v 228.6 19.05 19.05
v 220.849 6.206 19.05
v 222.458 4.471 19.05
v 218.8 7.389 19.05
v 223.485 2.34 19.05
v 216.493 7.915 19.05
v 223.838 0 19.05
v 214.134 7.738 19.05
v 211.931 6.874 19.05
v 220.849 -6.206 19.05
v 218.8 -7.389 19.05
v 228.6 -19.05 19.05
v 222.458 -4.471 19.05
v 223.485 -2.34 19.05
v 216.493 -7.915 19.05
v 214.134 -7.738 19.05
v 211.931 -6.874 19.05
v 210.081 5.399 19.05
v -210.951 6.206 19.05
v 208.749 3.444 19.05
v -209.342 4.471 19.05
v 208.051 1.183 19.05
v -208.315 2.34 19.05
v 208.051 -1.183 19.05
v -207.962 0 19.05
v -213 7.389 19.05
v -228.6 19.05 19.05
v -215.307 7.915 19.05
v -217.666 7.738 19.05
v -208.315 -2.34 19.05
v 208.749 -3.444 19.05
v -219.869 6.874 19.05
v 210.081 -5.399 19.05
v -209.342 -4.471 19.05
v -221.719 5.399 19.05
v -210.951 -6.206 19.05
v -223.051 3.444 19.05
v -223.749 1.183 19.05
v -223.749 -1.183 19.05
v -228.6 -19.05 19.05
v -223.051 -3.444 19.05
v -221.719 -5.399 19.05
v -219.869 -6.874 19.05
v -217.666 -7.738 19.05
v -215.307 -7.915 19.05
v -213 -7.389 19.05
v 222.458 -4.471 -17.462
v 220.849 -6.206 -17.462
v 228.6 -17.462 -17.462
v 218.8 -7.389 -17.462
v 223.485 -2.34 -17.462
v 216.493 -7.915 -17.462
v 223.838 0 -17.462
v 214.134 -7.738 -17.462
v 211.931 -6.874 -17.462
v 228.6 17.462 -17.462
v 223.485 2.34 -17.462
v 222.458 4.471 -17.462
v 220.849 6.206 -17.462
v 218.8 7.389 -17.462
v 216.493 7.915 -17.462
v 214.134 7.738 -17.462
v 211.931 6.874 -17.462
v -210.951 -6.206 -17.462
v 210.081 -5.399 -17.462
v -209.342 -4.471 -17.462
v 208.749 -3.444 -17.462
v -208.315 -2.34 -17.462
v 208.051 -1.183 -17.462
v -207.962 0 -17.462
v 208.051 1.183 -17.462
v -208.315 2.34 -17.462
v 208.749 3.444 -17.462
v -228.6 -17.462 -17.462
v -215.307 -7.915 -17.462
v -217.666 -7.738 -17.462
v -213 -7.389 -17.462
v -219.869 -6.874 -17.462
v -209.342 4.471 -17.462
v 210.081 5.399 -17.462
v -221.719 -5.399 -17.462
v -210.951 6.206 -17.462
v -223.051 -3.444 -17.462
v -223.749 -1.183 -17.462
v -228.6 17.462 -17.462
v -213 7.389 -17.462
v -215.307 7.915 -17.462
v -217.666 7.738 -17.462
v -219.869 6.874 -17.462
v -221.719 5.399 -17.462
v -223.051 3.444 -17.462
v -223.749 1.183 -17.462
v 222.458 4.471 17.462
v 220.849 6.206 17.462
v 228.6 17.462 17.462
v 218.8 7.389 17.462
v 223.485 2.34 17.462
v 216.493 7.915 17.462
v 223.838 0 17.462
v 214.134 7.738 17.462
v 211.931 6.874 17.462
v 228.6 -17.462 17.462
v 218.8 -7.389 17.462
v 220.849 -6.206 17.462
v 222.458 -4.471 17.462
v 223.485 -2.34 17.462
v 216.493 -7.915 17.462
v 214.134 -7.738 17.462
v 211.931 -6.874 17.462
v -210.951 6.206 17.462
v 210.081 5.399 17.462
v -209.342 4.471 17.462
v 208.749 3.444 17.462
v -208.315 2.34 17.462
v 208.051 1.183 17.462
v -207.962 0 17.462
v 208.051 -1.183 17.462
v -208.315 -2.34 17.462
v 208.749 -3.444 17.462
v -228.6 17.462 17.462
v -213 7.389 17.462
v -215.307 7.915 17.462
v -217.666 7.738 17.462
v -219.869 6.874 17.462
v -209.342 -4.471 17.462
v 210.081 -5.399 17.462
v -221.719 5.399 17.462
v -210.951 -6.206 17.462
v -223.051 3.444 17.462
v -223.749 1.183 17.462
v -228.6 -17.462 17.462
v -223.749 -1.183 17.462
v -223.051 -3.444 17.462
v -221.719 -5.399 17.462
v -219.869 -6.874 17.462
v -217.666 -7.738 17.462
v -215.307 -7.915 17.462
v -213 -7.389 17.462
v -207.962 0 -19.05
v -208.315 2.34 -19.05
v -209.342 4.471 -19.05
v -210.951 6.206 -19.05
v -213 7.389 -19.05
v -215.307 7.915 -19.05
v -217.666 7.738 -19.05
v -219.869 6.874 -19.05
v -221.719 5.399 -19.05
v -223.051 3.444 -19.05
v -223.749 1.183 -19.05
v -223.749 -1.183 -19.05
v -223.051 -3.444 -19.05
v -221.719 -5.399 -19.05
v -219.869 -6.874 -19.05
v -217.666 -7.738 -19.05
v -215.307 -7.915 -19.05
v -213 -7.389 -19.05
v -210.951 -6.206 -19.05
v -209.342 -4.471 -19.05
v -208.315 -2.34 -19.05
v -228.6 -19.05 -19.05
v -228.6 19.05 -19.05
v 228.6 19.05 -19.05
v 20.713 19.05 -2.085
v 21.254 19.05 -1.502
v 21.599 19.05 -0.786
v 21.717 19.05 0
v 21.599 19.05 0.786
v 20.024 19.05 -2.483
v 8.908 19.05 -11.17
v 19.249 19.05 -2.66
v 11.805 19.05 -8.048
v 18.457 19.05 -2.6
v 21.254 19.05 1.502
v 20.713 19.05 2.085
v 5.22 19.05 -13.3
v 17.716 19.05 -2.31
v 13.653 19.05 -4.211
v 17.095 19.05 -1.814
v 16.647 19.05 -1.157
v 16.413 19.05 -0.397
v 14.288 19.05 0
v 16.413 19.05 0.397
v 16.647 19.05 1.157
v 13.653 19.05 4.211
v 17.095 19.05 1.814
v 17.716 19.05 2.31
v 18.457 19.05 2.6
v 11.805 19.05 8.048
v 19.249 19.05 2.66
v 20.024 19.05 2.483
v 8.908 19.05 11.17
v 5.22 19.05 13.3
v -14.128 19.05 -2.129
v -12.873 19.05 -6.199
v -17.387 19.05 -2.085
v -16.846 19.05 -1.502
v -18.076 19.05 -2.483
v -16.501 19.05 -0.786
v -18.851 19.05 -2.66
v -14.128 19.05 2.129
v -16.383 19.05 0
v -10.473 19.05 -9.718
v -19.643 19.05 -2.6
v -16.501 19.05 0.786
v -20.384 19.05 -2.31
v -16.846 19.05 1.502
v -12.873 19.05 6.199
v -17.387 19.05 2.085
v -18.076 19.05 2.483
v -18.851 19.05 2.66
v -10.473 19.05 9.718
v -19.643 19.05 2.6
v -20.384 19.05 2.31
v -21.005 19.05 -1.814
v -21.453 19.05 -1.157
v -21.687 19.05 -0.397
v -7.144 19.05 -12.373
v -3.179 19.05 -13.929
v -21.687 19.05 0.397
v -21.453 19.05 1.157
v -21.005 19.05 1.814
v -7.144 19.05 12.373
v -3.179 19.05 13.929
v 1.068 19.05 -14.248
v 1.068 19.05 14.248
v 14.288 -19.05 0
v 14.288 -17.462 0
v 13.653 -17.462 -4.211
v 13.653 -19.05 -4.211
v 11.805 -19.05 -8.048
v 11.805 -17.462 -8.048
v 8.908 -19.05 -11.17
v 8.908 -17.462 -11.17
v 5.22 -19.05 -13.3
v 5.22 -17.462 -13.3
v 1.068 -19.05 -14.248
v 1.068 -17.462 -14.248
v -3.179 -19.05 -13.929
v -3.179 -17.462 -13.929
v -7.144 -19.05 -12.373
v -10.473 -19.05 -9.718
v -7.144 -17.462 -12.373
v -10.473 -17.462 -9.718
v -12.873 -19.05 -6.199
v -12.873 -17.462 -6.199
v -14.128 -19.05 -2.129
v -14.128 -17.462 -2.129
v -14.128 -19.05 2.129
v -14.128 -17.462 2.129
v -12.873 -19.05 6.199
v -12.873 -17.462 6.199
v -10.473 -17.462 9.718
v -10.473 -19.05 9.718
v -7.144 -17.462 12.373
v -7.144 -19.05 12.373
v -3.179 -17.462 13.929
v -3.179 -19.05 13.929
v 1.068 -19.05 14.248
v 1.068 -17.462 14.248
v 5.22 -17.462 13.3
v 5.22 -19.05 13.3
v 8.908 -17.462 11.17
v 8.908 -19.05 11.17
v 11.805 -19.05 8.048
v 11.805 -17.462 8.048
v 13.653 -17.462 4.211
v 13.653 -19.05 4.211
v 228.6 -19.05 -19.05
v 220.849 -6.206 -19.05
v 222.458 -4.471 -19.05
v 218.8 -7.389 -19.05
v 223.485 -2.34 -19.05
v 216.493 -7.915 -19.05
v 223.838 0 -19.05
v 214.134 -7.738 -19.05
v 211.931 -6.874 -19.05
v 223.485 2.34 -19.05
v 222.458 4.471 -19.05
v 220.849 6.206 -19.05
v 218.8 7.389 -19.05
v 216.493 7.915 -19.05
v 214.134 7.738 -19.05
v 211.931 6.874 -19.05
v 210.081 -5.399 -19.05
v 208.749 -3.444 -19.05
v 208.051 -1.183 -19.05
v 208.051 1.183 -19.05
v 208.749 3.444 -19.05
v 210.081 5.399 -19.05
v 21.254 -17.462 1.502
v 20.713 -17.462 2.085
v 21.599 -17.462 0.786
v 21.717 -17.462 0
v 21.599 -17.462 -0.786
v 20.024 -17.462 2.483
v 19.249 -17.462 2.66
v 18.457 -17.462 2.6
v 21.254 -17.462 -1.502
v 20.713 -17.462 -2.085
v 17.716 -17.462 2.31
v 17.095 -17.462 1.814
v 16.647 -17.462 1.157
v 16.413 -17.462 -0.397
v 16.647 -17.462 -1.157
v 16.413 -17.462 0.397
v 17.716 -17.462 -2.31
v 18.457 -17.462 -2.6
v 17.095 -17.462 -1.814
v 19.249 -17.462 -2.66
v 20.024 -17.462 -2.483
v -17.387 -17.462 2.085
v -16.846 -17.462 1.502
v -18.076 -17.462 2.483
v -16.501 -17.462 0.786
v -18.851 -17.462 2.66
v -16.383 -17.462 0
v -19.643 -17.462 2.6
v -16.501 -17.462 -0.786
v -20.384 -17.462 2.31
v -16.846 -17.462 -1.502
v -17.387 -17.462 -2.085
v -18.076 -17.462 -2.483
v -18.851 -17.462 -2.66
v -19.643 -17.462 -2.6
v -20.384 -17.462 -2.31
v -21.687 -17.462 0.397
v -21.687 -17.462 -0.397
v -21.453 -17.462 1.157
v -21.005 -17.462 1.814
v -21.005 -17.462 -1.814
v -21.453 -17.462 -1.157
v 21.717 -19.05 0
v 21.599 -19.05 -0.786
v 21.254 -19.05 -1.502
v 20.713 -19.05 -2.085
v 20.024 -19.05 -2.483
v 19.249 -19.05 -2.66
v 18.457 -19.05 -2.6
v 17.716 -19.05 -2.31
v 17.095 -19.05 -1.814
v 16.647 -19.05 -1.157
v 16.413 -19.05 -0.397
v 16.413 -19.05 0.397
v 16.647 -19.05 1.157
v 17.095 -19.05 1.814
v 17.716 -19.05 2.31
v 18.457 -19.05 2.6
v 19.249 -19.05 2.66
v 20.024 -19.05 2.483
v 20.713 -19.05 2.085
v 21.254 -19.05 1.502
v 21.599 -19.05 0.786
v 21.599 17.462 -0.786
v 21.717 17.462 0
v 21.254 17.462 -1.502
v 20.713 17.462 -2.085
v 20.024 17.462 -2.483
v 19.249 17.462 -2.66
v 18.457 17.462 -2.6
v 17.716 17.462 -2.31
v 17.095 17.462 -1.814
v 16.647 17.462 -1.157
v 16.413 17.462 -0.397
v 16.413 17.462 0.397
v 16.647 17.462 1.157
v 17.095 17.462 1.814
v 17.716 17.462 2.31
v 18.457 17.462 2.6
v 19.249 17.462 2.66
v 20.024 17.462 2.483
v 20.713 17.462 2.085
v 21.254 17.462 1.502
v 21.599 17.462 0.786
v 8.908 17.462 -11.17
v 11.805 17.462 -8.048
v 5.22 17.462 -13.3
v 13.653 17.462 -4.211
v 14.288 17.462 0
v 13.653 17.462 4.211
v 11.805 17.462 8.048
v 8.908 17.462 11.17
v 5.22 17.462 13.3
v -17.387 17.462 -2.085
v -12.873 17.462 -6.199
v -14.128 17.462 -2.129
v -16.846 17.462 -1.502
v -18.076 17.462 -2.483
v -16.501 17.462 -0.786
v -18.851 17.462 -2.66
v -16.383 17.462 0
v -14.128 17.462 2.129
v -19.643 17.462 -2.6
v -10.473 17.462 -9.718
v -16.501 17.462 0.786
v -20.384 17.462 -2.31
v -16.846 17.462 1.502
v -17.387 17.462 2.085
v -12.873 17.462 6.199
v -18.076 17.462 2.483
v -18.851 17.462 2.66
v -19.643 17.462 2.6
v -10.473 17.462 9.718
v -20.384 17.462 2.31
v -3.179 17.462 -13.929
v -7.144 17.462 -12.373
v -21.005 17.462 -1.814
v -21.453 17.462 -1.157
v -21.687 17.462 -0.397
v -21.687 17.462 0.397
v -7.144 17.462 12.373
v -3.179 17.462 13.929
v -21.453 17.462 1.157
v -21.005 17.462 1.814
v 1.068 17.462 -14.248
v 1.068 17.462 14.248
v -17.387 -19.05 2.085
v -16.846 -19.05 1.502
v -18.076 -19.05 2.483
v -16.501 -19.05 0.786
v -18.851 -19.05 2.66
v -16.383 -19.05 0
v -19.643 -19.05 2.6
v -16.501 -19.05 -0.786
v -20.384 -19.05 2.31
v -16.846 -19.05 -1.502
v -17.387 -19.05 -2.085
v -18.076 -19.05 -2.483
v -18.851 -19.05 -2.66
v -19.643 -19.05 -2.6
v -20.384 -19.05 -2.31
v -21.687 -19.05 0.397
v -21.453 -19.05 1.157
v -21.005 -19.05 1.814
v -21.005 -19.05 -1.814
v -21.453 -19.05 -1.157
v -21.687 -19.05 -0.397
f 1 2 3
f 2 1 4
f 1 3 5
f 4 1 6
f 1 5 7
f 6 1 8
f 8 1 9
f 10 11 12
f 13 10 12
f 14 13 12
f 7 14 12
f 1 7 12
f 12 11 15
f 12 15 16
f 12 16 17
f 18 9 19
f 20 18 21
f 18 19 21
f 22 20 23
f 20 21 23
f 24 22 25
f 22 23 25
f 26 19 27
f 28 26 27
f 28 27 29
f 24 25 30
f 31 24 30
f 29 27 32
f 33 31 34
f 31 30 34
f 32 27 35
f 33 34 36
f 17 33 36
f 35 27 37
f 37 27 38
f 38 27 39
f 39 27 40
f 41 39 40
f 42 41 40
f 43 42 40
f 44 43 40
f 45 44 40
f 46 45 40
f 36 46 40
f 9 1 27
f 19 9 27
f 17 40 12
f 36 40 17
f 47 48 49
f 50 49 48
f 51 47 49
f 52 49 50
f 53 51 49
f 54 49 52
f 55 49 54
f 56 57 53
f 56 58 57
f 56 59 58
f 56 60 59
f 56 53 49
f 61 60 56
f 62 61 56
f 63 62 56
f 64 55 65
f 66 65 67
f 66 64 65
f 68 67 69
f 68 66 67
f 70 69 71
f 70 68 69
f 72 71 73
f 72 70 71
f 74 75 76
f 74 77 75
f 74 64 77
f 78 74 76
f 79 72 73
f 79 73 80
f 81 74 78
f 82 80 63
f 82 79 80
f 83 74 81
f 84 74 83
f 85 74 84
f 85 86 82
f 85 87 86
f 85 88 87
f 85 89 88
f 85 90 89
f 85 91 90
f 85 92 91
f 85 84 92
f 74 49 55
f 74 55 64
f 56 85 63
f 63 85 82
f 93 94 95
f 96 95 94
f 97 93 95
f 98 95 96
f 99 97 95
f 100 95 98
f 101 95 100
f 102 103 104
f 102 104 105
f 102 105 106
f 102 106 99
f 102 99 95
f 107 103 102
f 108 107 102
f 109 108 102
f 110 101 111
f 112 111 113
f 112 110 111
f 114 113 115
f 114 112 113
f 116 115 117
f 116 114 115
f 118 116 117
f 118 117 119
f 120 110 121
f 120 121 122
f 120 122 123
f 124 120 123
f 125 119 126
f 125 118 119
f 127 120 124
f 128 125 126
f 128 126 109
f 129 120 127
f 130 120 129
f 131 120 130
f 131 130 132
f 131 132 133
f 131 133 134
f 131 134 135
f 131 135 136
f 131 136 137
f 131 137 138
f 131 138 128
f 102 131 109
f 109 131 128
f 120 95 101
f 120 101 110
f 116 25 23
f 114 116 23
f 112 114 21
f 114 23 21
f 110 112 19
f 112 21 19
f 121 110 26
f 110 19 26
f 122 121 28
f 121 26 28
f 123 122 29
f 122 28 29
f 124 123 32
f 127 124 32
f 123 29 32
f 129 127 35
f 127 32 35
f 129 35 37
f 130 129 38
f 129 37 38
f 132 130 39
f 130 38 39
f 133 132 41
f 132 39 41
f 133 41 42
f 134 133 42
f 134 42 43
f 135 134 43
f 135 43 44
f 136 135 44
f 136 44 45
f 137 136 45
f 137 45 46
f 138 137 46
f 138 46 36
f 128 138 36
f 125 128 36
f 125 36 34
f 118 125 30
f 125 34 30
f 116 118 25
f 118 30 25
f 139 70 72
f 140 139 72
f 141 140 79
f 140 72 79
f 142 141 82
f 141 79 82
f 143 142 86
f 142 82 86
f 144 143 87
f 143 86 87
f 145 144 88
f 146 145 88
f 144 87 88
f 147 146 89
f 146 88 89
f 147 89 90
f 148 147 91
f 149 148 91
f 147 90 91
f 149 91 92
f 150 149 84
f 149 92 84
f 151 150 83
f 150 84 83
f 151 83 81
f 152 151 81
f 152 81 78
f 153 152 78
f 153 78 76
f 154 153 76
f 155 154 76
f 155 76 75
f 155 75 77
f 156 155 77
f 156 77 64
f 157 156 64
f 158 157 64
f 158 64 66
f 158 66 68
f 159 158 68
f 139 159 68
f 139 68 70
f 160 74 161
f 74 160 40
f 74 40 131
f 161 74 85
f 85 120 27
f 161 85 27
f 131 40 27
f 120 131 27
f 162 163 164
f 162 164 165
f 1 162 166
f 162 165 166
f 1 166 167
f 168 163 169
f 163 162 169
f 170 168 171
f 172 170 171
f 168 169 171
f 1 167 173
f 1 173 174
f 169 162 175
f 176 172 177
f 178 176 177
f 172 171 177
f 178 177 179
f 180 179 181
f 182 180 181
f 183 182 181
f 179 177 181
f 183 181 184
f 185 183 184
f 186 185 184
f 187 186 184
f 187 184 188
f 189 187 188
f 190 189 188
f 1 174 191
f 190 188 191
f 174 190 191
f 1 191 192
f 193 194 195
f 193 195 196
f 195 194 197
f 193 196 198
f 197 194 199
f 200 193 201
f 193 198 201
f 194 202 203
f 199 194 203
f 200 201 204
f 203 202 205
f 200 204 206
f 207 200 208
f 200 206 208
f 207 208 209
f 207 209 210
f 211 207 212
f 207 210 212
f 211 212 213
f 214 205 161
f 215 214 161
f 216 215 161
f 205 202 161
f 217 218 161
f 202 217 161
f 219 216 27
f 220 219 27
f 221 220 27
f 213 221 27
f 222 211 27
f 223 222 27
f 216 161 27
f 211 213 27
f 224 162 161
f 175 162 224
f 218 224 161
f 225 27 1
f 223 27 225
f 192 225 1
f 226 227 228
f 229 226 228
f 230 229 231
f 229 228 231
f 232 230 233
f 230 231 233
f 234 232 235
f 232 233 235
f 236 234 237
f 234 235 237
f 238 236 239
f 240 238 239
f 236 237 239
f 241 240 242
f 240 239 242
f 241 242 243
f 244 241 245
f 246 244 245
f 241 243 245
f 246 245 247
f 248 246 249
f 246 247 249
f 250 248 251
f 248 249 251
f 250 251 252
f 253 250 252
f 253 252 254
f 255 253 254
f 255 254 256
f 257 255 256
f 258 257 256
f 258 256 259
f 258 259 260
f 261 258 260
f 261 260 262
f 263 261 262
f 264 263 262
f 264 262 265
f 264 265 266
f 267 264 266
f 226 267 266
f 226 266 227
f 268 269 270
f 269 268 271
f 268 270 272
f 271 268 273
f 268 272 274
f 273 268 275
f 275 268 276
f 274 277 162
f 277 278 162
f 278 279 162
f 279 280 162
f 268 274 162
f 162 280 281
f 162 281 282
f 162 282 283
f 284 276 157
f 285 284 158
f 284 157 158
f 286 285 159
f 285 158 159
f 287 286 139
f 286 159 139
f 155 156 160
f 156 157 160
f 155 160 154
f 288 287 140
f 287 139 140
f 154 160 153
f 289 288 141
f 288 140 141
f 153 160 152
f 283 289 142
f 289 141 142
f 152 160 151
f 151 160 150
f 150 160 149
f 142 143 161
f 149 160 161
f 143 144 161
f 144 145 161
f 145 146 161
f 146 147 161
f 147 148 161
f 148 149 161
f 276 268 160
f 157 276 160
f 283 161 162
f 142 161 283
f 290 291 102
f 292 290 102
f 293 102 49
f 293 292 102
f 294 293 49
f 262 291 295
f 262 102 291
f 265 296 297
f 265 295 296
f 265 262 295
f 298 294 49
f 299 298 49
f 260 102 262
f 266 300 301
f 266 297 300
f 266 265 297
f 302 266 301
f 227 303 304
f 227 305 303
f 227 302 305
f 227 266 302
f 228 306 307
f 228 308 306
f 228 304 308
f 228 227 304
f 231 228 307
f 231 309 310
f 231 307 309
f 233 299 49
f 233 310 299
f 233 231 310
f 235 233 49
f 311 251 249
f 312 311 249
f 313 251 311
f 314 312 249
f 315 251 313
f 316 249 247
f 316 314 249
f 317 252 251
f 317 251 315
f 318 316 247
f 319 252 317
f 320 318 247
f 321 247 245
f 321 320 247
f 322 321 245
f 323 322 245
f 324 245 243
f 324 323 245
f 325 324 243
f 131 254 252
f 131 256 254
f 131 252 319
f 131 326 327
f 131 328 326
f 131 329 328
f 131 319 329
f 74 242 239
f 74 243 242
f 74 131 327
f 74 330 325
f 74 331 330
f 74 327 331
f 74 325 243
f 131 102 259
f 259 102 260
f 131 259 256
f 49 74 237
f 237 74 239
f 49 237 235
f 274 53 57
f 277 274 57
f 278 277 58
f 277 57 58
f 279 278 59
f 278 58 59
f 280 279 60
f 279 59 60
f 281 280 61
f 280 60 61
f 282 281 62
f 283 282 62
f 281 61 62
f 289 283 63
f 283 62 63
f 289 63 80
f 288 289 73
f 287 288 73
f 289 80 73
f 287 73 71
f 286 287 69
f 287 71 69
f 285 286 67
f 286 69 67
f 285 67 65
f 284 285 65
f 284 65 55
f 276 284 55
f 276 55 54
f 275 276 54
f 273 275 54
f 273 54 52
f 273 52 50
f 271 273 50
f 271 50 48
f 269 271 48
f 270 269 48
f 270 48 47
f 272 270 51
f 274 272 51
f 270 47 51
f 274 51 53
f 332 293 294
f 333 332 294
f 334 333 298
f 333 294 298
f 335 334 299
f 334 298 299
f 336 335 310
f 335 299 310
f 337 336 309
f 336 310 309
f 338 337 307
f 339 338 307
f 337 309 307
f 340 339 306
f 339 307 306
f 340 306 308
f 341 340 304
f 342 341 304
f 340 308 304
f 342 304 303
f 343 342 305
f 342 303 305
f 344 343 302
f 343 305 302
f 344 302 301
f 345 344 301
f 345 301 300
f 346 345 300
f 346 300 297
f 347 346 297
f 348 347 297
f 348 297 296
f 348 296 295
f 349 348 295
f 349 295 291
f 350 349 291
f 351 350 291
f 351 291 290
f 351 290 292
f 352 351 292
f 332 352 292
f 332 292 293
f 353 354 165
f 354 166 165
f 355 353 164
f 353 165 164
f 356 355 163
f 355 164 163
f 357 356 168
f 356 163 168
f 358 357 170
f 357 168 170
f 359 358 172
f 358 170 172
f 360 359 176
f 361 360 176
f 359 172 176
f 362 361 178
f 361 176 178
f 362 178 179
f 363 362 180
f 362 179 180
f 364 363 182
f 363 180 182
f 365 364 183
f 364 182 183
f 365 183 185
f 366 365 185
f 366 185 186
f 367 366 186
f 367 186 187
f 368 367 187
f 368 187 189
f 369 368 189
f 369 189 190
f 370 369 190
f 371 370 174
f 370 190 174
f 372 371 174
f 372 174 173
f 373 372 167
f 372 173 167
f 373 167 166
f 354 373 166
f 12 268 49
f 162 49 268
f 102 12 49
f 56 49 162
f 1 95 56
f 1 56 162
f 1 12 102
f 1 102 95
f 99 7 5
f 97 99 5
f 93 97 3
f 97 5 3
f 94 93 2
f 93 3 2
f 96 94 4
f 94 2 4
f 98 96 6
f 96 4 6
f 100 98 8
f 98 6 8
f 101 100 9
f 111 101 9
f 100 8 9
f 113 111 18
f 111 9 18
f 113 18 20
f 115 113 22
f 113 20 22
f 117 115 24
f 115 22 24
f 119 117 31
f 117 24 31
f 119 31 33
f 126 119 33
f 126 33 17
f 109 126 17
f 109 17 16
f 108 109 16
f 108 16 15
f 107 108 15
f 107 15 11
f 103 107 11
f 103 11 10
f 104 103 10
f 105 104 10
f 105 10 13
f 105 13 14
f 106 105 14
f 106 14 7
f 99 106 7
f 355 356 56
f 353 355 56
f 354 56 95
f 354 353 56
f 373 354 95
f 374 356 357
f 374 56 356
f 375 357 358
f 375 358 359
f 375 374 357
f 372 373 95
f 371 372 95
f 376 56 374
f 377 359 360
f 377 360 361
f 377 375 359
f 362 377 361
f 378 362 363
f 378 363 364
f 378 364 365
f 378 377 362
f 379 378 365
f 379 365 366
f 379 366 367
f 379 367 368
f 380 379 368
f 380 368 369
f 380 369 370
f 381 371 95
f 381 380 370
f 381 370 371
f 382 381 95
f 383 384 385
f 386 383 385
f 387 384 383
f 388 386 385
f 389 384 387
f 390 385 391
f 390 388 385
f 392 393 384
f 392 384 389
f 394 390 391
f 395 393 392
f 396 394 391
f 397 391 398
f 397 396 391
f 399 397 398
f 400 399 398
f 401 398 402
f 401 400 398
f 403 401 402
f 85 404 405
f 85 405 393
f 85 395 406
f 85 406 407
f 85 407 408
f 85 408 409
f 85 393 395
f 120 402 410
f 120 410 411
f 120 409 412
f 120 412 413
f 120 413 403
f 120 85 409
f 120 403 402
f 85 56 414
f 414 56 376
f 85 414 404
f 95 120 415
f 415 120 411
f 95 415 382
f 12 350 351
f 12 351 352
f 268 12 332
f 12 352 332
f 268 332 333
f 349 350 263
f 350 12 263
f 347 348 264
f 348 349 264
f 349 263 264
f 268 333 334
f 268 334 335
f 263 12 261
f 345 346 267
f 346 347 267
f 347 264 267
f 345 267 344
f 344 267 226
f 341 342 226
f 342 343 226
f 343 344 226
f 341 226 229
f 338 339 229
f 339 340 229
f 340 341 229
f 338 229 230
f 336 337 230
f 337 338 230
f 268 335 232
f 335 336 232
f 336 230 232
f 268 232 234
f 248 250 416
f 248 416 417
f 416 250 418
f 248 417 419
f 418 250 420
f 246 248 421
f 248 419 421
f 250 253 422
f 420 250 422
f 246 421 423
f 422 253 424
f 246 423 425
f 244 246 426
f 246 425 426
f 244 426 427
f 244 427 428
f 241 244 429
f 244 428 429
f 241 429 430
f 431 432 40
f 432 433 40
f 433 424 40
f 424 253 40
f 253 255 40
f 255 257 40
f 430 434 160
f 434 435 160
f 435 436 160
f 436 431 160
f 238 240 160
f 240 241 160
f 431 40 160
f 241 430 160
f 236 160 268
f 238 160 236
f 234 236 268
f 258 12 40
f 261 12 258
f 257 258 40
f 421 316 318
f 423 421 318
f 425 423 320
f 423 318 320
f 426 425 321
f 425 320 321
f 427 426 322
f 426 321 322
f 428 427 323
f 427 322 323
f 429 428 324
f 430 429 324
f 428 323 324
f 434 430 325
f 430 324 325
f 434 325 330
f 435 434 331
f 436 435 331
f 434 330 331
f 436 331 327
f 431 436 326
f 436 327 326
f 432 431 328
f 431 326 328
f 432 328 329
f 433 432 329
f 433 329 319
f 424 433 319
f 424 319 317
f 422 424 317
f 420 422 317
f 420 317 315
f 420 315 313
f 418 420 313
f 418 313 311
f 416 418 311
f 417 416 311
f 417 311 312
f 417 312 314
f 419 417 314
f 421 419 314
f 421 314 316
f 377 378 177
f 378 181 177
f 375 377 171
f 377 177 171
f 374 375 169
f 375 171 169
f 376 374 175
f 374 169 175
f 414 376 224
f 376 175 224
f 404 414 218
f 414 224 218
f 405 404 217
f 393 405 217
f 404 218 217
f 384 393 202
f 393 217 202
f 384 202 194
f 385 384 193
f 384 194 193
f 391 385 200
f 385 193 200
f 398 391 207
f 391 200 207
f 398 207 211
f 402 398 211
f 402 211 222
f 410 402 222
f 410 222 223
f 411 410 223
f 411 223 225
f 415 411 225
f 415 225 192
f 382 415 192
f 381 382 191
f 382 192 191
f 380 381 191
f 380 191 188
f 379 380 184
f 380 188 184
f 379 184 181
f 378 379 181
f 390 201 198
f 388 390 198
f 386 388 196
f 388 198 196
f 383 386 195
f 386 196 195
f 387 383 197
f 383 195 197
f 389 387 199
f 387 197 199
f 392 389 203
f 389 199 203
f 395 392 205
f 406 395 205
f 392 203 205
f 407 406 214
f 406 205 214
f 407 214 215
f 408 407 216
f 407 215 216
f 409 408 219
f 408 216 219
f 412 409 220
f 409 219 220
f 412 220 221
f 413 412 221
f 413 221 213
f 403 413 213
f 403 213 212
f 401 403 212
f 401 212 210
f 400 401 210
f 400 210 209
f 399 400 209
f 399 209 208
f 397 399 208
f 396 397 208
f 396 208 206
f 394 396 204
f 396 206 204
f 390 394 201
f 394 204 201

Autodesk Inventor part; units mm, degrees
ref_plane "YZ Plane" through (0, 0, 0) normal (1, 0, 0) x (0, 1, 0)
ref_plane "XZ Plane" through (0, 0, 0) normal (0, 1, 0) x (-1, 0, 0)
ref_plane "XY Plane" through (0, 0, 0) normal (0, 0, 1) x (1, 0, 0)
sketch "Sketch2" plane through (0, 0, 0) normal (1, 0, 0) x (0, 1, 0)
  line L0 (0, -26.67) -> (0, 26.67) construction
  line L1 (-26.67, 0) -> (26.67, 0) construction
  line L2 (17.4625, 17.4625) -> (-17.4625, 17.4625)
  line L3 (-17.4625, 17.4625) -> (-17.4625, -17.4625)
  line L4 (-17.4625, -17.4625) -> (17.4625, -17.4625)
  line L5 (17.4625, -17.4625) -> (17.4625, 17.4625)
  line L6 (19.05, 19.05) -> (-19.05, 19.05)
  line L7 (-19.05, 19.05) -> (-19.05, -19.05)
  line L8 (-19.05, -19.05) -> (19.05, -19.05)
  line L9 (19.05, -19.05) -> (19.05, 19.05)
  point P0 (0, 0)
  point P1 (0, 19.05)
  point P2 (0, 17.4625)
  point P3 (17.4625, 0)
  point P4 (19.05, 0)
  dimension "d0" = 1.5875
  dimension "d1" = 38.1
extrude "Extrusion1" add sketch "Sketch2" along normal mid plane 457.2
sketch "Sketch3" plane through (-228.6, -19.05, 19.05) normal (0, 0, 1) x (1, 0, 0)
  line L0 (-91.44, 19.05) -> (548.64, 19.05) construction
  line L1 (228.6, -7.62) -> (228.6, 45.72) construction
  circle A0 centre (12.7, 19.05) radius 7.9375
  line L2 (0, 0) -> (0, 38.1) construction
  circle A1 centre (444.5, 19.05) radius 7.9375
  point P0 (228.6, 19.05)
  dimension "d4" = 12.7
  dimension "d5" = 15.875
extrude "Extrusion2" cut sketch "Sketch3" against normal through all
sketch "Sketch5" plane through (-228.6, 19.05, 19.05) normal (0, 1, 0) x (1, 0, 0)
  circle A0 centre (228.6, 19.05) radius 14.2875
  dimension "d11" = 28.575
extrude "Extrusion4" cut sketch "Sketch5" against normal through all
sketch "Sketch6" plane through (-228.6, 19.05, 19.05) normal (0, 1, 0) x (1, 0, 0)
  line L0 (-91.44, 19.05) -> (548.64, 19.05) construction
  line L1 (228.6, 45.72) -> (228.6, -7.62) construction
  circle A0 centre (209.55, 19.05) radius 3.175 construction
  circle A1 centre (247.65, 19.05) radius 3.175 construction
  circle A2 centre (228.6, 19.05) radius 15.875 construction
  circle A3 centre (209.55, 19.05) radius 2.667
  circle A4 centre (247.65, 19.05) radius 2.667
  dimension "d14" = 31.75
  dimension "d15" = 6.35
  dimension "d16" = 5.334
extrude "Extrusion5" cut sketch "Sketch6" against normal through all
properties part number "Crossbeam" material "Aluminum 6061"
